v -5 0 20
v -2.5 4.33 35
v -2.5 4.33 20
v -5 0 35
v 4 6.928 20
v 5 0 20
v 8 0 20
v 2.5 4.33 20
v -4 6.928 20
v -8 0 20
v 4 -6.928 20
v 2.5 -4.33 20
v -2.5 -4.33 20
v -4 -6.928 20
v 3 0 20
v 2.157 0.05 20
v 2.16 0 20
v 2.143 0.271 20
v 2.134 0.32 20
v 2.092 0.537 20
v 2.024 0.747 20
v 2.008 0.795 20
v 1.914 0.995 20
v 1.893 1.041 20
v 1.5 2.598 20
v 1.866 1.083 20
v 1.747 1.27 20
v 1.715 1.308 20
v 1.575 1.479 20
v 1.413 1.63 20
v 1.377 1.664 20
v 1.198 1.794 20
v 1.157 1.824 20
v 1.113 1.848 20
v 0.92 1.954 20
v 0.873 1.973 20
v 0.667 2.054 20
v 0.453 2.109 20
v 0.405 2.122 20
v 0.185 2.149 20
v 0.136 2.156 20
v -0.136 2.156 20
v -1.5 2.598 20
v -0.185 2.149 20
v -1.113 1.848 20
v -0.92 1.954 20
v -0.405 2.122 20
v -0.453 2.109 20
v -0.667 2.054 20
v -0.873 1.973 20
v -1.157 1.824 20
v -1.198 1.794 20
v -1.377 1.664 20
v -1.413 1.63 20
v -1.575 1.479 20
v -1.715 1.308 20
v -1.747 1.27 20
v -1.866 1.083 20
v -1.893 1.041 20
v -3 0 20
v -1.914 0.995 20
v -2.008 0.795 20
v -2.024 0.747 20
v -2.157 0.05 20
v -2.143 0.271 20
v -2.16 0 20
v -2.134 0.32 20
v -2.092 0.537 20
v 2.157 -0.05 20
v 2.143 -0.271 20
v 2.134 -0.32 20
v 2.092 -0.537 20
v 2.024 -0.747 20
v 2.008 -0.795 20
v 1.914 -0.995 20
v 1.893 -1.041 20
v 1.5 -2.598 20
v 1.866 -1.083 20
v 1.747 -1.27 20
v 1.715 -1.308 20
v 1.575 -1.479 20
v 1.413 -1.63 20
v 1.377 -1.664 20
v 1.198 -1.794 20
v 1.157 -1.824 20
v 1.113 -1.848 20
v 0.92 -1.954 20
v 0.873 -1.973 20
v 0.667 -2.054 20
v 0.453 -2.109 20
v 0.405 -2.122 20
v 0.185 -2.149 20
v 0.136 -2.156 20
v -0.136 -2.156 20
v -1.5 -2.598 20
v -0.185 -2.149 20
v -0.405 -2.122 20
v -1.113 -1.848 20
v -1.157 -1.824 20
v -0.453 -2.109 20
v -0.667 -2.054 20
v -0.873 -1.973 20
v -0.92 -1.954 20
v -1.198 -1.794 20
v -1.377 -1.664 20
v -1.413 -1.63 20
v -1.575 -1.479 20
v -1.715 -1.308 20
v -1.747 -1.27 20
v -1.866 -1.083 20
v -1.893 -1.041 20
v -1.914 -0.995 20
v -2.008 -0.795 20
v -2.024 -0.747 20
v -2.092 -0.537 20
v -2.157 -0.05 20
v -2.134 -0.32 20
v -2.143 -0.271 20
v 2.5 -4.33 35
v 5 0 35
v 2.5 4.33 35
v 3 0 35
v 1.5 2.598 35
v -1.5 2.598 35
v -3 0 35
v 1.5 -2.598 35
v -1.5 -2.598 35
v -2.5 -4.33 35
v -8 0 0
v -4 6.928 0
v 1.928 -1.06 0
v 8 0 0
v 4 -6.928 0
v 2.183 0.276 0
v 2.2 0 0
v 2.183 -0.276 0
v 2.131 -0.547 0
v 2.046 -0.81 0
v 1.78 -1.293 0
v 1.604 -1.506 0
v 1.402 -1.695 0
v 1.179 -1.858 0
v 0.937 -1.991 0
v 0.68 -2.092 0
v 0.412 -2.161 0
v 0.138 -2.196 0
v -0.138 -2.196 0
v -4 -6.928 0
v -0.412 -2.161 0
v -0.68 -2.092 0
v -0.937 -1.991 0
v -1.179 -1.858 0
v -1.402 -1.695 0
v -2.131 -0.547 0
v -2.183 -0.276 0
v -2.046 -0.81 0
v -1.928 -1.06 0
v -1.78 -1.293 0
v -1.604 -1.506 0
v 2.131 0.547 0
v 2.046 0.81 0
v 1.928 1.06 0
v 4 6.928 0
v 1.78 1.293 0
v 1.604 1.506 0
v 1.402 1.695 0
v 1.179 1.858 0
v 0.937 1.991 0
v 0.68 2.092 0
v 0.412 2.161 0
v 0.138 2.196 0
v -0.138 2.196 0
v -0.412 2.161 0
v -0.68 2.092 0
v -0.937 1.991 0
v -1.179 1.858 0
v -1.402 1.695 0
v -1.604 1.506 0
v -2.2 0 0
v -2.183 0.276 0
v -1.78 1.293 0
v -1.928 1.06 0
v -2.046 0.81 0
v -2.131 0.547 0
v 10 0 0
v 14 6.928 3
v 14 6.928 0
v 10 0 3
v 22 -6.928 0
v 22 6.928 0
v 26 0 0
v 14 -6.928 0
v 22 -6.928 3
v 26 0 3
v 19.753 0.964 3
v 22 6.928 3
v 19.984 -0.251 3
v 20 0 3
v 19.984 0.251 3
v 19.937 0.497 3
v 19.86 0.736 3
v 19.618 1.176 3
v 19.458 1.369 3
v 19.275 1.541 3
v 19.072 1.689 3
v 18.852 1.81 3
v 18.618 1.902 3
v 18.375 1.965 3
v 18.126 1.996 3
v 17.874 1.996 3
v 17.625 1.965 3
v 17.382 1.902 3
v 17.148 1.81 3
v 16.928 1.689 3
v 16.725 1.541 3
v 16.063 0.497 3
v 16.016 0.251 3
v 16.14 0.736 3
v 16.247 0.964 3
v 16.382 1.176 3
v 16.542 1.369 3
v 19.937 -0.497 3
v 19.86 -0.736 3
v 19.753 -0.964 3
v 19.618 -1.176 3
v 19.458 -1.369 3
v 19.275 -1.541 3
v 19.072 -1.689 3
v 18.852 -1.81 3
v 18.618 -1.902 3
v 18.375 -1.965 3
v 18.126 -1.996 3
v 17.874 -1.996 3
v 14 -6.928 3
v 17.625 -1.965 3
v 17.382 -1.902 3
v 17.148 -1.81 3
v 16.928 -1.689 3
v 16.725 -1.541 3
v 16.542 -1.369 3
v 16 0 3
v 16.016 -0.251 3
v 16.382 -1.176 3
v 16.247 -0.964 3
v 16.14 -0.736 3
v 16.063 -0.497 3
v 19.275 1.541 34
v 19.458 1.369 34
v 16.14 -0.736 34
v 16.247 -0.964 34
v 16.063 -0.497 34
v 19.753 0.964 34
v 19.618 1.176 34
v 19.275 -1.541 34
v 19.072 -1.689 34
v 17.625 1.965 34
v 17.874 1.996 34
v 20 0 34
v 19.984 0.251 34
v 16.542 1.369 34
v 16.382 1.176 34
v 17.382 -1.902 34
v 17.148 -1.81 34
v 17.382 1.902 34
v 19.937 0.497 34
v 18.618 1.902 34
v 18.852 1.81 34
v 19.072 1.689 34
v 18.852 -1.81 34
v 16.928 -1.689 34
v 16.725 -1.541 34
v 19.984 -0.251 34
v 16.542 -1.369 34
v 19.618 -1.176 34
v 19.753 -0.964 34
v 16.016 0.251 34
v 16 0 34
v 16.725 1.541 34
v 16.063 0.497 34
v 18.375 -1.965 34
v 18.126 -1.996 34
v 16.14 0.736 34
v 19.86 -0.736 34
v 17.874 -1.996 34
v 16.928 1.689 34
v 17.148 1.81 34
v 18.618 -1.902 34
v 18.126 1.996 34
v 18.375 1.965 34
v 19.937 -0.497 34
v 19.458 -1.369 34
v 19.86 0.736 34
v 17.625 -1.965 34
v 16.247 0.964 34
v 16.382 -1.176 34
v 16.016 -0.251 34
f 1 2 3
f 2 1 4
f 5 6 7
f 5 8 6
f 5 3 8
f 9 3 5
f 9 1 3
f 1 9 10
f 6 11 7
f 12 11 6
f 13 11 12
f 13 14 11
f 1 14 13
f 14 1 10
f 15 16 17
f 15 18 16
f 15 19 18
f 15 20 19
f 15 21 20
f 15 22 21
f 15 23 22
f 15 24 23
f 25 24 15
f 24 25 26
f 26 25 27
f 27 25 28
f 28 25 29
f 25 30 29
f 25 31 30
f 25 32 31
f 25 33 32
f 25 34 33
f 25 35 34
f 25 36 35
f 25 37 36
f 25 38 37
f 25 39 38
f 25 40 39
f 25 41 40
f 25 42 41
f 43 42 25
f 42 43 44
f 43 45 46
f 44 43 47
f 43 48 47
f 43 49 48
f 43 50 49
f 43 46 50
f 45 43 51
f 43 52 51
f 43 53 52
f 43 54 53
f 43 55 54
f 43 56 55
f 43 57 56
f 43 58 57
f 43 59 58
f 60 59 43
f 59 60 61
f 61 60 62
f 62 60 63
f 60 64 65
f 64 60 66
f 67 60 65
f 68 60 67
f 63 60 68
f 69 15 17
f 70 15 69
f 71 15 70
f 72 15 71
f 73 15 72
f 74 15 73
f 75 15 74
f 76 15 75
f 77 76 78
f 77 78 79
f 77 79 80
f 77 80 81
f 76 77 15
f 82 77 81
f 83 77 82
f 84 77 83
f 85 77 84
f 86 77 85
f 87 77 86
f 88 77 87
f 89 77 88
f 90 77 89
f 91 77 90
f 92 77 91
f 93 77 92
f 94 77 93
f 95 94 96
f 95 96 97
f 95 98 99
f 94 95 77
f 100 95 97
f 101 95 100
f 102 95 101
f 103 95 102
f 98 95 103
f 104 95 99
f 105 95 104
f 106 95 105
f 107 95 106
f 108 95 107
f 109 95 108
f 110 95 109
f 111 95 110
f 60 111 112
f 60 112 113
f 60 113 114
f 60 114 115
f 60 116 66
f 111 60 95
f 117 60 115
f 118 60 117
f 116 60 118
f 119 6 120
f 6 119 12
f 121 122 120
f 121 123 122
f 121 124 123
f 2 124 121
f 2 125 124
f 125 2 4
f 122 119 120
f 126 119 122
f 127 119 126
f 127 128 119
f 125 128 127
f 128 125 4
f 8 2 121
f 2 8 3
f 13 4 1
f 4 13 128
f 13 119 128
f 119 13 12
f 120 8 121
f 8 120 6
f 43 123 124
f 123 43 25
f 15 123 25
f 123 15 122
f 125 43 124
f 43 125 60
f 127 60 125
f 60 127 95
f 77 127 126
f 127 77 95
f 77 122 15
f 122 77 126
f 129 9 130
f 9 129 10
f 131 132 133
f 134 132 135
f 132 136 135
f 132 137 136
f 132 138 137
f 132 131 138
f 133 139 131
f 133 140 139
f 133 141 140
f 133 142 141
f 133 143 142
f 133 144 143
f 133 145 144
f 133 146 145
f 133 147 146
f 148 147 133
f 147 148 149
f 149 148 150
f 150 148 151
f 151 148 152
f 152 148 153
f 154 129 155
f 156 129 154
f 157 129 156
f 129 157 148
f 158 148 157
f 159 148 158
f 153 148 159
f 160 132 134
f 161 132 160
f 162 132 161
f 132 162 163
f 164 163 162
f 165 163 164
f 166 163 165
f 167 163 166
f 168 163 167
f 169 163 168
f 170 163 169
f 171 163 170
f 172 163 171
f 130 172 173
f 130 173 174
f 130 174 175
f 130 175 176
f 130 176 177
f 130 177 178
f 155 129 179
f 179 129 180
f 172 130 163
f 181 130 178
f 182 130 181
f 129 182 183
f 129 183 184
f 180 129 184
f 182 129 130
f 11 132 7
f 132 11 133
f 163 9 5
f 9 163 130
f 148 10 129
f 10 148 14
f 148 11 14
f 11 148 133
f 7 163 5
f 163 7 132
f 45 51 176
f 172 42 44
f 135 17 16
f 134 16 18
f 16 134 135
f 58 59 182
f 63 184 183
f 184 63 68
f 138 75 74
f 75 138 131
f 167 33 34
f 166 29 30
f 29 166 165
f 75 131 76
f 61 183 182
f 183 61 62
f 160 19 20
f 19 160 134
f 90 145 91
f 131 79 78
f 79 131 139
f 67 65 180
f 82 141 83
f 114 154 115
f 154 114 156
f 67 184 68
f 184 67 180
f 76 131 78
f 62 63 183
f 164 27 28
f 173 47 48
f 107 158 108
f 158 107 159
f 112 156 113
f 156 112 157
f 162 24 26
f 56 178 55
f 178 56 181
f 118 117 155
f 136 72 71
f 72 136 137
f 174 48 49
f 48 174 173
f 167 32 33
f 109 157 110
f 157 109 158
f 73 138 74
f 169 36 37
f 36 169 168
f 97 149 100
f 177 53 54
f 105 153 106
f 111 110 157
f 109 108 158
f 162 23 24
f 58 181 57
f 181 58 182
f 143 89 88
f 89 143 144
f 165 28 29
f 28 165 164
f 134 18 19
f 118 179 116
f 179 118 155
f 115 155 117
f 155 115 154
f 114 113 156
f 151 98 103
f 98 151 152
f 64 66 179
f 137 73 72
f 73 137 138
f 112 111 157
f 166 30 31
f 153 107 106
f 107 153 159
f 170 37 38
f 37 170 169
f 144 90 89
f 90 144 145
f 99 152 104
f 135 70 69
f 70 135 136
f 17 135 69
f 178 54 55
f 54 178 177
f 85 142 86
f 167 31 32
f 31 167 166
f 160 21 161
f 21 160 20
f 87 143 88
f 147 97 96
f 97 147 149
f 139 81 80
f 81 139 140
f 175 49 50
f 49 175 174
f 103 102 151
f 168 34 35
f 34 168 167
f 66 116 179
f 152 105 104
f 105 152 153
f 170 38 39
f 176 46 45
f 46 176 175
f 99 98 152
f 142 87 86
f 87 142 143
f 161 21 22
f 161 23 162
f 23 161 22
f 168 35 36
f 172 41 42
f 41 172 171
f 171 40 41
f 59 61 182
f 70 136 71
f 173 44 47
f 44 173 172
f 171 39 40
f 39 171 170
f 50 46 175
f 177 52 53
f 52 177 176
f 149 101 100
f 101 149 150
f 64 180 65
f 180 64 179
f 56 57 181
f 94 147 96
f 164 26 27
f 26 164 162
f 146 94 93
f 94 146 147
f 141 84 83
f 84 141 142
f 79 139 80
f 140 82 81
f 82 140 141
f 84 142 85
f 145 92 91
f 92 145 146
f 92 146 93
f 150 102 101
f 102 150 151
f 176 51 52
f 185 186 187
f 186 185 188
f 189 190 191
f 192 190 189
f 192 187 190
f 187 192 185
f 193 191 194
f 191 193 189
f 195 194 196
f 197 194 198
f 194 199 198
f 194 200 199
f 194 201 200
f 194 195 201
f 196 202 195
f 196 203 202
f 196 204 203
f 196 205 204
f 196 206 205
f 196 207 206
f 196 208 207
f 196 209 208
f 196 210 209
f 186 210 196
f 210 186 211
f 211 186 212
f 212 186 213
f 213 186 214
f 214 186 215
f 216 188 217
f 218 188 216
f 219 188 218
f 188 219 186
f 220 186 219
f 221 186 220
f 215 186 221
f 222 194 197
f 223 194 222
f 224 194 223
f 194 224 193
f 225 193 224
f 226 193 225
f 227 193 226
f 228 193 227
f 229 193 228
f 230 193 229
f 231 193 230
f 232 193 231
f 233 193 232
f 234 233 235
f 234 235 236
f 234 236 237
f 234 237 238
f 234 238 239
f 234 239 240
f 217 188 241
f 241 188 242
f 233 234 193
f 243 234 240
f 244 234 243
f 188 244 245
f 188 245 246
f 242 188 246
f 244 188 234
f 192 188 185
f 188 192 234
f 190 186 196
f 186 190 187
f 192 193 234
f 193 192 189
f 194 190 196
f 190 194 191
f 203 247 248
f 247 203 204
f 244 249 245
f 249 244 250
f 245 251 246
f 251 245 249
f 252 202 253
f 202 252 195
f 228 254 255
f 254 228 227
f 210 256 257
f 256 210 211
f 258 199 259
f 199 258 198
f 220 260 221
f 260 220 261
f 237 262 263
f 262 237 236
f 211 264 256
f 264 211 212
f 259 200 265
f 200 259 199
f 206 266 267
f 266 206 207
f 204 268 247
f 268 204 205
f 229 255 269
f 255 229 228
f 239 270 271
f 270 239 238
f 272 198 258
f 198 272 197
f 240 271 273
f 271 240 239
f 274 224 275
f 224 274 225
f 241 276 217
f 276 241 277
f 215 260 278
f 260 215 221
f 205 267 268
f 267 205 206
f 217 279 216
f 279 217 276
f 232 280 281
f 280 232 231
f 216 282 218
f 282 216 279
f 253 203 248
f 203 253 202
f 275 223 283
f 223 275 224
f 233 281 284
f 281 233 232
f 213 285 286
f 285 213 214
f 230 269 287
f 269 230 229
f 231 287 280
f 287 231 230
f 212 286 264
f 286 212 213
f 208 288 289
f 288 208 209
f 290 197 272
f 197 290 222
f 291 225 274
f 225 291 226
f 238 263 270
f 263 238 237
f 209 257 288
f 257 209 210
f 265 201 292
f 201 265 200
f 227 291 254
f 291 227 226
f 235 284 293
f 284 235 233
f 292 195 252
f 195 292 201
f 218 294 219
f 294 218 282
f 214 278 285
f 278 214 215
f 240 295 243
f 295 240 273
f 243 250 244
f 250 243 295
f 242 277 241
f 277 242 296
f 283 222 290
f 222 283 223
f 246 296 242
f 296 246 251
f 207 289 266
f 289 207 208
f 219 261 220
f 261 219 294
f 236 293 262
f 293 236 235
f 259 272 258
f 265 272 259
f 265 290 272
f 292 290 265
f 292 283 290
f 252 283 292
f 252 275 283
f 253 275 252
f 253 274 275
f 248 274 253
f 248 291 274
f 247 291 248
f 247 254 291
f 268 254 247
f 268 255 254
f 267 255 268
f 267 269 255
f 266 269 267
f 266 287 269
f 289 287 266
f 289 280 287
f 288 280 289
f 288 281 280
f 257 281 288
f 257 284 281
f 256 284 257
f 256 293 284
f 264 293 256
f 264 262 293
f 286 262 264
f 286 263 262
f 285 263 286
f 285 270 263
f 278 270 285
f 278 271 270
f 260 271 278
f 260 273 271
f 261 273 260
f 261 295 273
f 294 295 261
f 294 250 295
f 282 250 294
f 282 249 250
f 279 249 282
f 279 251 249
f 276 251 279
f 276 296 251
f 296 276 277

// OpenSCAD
// The accuracy of your printer
printer_accuracy = 0.2;
// If you need aremover for the nuts
remover = "yes";//[yes,no]
// height of the holder in mm
height = 20;
// Outer diameter of your nuts in mm
nut_diameter = 3;
// Diameter of the handle in mm
Main_diameter = 8;
// Lengh of the screws you want to secrew your nuts on in mm
screw_lengh = 15;
if (remover == "yes") {
  union(){
    difference() {
      union(){
        linear_extrude( height=height, twist=0, scale=[1, 1], center=false){
          {
            $fn=6;    //set sides to 6
            circle(r=Main_diameter);
          }
        }
        translate([0, 0, height]){
          difference() {
            linear_extrude( height=screw_lengh, twist=0, scale=[1, 1], center=false){
              {
                $fn=6;    //set sides to 6
                circle(r=(nut_diameter + 2));
              }
            }

            linear_extrude( height=screw_lengh, twist=0, scale=[1, 1], center=false){
              {
                $fn=6;    //set sides to 6
                circle(r=nut_diameter);
              }
            }
          }
        }
      }

      {
        $fn=50;    //set sides to 50
        cylinder(r1=(2 + printer_accuracy), r2=2, h=100, center=false);
      }
    }
    translate([(Main_diameter + 10), 0, 0]){
      union(){
        linear_extrude( height=3, twist=0, scale=[1, 1], center=false){
          {
            $fn=6;    //set sides to 6
            circle(r=Main_diameter);
          }
        }
        {
          $fn=50;    //set sides to 50
          cylinder(r1=2, r2=2, h=(height + (screw_lengh - 1)), center=false);
        }
      }
    }
  }
} else {
  union(){
    linear_extrude( height=height, twist=0, scale=[1, 1], center=false){
      {
        $fn=6;    //set sides to 6
        circle(r=Main_diameter);
      }
    }
    translate([0, 0, height]){
      difference() {
        linear_extrude( height=screw_lengh, twist=0, scale=[1, 1], center=false){
          {
            $fn=6;    //set sides to 6
            circle(r=(nut_diameter + 2));
          }
        }

        linear_extrude( height=screw_lengh, twist=0, scale=[1, 1], center=false){
          {
            $fn=6;    //set sides to 6
            circle(r=nut_diameter);
          }
        }
      }
    }
  }
}
